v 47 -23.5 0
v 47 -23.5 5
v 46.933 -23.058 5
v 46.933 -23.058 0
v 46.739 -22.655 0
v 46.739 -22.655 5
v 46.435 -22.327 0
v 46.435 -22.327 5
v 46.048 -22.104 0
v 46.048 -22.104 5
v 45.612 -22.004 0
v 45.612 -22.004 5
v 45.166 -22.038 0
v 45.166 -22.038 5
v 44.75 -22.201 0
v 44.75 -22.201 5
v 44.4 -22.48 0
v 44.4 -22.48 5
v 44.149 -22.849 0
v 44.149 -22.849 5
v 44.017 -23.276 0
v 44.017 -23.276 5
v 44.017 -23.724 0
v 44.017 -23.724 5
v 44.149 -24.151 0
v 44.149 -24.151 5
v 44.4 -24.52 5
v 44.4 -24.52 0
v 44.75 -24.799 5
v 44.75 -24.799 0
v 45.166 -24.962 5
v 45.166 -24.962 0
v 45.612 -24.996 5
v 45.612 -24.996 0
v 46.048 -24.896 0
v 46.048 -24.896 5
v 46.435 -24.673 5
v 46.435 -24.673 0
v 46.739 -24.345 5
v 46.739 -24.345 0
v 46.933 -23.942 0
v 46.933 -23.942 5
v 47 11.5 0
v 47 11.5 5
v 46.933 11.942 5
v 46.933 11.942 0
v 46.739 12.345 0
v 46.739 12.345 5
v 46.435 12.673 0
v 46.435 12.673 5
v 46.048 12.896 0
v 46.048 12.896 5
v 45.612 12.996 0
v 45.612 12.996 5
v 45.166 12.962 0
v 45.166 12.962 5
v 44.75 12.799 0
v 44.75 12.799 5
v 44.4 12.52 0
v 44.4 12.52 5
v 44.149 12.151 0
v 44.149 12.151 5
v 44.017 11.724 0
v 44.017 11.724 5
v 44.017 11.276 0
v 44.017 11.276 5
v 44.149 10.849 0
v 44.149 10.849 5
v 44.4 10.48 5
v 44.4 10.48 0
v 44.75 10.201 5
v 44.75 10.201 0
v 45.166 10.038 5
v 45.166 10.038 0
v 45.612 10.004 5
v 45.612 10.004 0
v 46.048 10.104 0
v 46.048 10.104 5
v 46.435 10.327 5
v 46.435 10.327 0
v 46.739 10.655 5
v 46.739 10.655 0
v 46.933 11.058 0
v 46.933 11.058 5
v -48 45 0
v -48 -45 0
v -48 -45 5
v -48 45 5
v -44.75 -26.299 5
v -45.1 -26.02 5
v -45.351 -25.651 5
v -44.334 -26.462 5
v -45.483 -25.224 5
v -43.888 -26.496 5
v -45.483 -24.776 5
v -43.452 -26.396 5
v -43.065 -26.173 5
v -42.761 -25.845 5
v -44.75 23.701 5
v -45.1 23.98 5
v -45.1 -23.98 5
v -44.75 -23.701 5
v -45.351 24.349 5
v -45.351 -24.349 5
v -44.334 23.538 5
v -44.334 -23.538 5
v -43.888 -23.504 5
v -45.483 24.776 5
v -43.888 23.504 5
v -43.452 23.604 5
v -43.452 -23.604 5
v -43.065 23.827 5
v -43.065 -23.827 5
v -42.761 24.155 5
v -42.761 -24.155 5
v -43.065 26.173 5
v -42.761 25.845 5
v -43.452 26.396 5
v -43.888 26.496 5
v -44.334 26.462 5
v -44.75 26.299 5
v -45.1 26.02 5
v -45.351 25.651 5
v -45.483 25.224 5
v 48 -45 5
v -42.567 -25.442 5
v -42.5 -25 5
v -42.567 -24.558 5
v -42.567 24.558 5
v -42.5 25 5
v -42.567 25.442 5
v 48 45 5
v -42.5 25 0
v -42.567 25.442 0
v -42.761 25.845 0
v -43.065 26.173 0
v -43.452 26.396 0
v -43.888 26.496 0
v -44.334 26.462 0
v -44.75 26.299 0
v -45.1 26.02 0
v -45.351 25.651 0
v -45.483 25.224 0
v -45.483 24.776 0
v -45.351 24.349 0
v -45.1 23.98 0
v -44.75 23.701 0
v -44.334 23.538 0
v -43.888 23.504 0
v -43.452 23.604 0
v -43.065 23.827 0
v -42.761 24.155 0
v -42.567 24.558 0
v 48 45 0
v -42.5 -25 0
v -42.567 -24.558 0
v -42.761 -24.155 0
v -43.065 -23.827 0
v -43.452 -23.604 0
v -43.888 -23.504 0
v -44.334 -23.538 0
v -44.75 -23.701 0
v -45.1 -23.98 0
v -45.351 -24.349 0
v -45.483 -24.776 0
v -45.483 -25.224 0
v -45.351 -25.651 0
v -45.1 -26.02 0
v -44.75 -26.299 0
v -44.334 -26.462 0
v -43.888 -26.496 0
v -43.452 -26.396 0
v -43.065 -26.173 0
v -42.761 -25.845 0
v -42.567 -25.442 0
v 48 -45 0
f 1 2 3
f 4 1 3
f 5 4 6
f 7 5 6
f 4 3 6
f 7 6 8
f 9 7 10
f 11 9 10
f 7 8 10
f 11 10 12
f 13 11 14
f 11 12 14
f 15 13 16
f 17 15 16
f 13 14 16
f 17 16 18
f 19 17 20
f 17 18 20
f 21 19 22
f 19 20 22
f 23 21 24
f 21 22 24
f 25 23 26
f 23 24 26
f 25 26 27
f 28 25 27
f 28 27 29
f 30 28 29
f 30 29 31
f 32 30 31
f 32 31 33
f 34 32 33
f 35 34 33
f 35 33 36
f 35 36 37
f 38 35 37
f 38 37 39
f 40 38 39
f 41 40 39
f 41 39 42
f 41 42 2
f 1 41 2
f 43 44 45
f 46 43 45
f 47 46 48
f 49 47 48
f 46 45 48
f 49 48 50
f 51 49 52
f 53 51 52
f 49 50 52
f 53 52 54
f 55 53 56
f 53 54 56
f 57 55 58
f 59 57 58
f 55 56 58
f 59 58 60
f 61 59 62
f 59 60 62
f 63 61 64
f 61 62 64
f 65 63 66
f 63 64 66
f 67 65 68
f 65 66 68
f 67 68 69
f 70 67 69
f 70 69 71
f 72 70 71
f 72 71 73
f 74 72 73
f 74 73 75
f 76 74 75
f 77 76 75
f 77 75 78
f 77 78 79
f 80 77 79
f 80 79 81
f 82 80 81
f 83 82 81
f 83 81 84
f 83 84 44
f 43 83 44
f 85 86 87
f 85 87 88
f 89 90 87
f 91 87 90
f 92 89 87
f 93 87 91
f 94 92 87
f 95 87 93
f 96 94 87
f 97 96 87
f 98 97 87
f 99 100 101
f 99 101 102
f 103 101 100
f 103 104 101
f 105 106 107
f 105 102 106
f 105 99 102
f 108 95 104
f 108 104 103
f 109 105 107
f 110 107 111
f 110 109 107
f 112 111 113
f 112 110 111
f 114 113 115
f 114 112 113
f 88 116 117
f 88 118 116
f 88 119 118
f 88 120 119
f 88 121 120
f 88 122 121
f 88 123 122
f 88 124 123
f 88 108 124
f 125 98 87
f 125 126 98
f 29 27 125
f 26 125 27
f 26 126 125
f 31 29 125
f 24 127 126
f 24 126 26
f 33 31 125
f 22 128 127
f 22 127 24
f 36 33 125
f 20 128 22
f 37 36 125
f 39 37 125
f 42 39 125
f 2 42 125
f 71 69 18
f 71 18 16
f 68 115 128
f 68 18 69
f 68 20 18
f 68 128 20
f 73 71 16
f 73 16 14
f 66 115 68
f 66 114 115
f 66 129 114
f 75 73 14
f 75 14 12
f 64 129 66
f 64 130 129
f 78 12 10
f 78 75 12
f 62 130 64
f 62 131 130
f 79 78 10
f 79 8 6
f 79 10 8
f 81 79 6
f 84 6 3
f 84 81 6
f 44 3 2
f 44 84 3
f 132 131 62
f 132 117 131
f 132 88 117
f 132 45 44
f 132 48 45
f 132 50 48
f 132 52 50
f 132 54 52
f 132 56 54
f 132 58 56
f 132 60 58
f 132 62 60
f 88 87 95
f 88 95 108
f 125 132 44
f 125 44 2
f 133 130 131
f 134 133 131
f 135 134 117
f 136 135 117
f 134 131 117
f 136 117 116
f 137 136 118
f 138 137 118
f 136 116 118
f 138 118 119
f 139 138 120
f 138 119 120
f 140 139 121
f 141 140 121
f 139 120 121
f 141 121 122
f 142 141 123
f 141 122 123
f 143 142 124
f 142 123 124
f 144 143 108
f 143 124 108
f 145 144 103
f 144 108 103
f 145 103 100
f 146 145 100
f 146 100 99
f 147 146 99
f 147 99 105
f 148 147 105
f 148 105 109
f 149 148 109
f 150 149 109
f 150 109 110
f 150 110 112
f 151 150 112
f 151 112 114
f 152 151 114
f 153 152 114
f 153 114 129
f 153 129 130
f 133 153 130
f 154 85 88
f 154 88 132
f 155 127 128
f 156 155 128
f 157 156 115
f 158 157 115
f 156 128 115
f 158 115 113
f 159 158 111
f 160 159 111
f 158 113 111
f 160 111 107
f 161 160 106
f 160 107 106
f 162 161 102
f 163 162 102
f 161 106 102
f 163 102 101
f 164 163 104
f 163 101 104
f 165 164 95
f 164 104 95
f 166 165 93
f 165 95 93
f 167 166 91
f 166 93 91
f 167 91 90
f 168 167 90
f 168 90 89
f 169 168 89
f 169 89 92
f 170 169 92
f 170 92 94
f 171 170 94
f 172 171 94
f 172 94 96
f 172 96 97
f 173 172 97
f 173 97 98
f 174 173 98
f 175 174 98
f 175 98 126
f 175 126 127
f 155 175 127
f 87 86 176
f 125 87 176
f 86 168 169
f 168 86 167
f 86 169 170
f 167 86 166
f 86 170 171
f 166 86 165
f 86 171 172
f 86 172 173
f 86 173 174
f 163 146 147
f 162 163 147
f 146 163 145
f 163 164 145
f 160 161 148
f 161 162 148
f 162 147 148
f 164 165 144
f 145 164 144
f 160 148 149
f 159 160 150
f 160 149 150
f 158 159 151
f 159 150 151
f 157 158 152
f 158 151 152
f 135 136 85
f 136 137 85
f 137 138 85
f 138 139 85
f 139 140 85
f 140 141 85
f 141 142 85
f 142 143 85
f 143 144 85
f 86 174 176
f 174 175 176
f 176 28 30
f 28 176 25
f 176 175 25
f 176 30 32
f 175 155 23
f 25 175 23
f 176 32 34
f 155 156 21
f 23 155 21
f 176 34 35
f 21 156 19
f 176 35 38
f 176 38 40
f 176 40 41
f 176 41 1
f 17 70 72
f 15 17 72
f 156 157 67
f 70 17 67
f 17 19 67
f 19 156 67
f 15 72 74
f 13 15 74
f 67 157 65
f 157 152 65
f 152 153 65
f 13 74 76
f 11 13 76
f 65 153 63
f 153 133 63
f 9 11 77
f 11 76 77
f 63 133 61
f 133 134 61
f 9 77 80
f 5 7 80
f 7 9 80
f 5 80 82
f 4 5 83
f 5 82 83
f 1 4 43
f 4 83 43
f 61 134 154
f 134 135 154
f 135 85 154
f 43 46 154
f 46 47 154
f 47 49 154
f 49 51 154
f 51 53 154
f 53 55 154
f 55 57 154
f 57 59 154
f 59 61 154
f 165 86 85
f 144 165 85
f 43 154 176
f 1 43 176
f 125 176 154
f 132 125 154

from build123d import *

# Parameters (mm, degrees)
SKETCH1_W           = 96
SKETCH1_H           = 90
BOSS_EXTRUDE1_DEPTH = 5
SKETCH2_R           = 1.5
CUT_EXTRUDE1_DEPTH  = 6
SKETCH3_R           = 1.5
CUT_EXTRUDE2_DEPTH  = 6


with BuildPart() as part:
    # Sketch1 → Boss-Extrude1 (new body)
    with BuildSketch(Plane.XY):
        Rectangle(SKETCH1_W, SKETCH1_H)
    extrude(amount=BOSS_EXTRUDE1_DEPTH)

    # Sketch2 → Cut-Extrude1 (cut, through all)
    with BuildSketch(Plane.XY.offset(5)):
        with Locations((45.5, 11.5)):
            Circle(SKETCH2_R)
        with Locations((45.5, -23.5)):
            Circle(SKETCH2_R)
    extrude(amount=-CUT_EXTRUDE1_DEPTH, mode=Mode.SUBTRACT)

    # Sketch3 → Cut-Extrude2 (cut, through all)
    with BuildSketch(Plane.XY.offset(5)):
        with Locations((-44, 25)):
            Circle(SKETCH3_R)
        with Locations((-44, -25)):
            Circle(SKETCH3_R)
    extrude(amount=-CUT_EXTRUDE2_DEPTH, mode=Mode.SUBTRACT)


solid = part.part
